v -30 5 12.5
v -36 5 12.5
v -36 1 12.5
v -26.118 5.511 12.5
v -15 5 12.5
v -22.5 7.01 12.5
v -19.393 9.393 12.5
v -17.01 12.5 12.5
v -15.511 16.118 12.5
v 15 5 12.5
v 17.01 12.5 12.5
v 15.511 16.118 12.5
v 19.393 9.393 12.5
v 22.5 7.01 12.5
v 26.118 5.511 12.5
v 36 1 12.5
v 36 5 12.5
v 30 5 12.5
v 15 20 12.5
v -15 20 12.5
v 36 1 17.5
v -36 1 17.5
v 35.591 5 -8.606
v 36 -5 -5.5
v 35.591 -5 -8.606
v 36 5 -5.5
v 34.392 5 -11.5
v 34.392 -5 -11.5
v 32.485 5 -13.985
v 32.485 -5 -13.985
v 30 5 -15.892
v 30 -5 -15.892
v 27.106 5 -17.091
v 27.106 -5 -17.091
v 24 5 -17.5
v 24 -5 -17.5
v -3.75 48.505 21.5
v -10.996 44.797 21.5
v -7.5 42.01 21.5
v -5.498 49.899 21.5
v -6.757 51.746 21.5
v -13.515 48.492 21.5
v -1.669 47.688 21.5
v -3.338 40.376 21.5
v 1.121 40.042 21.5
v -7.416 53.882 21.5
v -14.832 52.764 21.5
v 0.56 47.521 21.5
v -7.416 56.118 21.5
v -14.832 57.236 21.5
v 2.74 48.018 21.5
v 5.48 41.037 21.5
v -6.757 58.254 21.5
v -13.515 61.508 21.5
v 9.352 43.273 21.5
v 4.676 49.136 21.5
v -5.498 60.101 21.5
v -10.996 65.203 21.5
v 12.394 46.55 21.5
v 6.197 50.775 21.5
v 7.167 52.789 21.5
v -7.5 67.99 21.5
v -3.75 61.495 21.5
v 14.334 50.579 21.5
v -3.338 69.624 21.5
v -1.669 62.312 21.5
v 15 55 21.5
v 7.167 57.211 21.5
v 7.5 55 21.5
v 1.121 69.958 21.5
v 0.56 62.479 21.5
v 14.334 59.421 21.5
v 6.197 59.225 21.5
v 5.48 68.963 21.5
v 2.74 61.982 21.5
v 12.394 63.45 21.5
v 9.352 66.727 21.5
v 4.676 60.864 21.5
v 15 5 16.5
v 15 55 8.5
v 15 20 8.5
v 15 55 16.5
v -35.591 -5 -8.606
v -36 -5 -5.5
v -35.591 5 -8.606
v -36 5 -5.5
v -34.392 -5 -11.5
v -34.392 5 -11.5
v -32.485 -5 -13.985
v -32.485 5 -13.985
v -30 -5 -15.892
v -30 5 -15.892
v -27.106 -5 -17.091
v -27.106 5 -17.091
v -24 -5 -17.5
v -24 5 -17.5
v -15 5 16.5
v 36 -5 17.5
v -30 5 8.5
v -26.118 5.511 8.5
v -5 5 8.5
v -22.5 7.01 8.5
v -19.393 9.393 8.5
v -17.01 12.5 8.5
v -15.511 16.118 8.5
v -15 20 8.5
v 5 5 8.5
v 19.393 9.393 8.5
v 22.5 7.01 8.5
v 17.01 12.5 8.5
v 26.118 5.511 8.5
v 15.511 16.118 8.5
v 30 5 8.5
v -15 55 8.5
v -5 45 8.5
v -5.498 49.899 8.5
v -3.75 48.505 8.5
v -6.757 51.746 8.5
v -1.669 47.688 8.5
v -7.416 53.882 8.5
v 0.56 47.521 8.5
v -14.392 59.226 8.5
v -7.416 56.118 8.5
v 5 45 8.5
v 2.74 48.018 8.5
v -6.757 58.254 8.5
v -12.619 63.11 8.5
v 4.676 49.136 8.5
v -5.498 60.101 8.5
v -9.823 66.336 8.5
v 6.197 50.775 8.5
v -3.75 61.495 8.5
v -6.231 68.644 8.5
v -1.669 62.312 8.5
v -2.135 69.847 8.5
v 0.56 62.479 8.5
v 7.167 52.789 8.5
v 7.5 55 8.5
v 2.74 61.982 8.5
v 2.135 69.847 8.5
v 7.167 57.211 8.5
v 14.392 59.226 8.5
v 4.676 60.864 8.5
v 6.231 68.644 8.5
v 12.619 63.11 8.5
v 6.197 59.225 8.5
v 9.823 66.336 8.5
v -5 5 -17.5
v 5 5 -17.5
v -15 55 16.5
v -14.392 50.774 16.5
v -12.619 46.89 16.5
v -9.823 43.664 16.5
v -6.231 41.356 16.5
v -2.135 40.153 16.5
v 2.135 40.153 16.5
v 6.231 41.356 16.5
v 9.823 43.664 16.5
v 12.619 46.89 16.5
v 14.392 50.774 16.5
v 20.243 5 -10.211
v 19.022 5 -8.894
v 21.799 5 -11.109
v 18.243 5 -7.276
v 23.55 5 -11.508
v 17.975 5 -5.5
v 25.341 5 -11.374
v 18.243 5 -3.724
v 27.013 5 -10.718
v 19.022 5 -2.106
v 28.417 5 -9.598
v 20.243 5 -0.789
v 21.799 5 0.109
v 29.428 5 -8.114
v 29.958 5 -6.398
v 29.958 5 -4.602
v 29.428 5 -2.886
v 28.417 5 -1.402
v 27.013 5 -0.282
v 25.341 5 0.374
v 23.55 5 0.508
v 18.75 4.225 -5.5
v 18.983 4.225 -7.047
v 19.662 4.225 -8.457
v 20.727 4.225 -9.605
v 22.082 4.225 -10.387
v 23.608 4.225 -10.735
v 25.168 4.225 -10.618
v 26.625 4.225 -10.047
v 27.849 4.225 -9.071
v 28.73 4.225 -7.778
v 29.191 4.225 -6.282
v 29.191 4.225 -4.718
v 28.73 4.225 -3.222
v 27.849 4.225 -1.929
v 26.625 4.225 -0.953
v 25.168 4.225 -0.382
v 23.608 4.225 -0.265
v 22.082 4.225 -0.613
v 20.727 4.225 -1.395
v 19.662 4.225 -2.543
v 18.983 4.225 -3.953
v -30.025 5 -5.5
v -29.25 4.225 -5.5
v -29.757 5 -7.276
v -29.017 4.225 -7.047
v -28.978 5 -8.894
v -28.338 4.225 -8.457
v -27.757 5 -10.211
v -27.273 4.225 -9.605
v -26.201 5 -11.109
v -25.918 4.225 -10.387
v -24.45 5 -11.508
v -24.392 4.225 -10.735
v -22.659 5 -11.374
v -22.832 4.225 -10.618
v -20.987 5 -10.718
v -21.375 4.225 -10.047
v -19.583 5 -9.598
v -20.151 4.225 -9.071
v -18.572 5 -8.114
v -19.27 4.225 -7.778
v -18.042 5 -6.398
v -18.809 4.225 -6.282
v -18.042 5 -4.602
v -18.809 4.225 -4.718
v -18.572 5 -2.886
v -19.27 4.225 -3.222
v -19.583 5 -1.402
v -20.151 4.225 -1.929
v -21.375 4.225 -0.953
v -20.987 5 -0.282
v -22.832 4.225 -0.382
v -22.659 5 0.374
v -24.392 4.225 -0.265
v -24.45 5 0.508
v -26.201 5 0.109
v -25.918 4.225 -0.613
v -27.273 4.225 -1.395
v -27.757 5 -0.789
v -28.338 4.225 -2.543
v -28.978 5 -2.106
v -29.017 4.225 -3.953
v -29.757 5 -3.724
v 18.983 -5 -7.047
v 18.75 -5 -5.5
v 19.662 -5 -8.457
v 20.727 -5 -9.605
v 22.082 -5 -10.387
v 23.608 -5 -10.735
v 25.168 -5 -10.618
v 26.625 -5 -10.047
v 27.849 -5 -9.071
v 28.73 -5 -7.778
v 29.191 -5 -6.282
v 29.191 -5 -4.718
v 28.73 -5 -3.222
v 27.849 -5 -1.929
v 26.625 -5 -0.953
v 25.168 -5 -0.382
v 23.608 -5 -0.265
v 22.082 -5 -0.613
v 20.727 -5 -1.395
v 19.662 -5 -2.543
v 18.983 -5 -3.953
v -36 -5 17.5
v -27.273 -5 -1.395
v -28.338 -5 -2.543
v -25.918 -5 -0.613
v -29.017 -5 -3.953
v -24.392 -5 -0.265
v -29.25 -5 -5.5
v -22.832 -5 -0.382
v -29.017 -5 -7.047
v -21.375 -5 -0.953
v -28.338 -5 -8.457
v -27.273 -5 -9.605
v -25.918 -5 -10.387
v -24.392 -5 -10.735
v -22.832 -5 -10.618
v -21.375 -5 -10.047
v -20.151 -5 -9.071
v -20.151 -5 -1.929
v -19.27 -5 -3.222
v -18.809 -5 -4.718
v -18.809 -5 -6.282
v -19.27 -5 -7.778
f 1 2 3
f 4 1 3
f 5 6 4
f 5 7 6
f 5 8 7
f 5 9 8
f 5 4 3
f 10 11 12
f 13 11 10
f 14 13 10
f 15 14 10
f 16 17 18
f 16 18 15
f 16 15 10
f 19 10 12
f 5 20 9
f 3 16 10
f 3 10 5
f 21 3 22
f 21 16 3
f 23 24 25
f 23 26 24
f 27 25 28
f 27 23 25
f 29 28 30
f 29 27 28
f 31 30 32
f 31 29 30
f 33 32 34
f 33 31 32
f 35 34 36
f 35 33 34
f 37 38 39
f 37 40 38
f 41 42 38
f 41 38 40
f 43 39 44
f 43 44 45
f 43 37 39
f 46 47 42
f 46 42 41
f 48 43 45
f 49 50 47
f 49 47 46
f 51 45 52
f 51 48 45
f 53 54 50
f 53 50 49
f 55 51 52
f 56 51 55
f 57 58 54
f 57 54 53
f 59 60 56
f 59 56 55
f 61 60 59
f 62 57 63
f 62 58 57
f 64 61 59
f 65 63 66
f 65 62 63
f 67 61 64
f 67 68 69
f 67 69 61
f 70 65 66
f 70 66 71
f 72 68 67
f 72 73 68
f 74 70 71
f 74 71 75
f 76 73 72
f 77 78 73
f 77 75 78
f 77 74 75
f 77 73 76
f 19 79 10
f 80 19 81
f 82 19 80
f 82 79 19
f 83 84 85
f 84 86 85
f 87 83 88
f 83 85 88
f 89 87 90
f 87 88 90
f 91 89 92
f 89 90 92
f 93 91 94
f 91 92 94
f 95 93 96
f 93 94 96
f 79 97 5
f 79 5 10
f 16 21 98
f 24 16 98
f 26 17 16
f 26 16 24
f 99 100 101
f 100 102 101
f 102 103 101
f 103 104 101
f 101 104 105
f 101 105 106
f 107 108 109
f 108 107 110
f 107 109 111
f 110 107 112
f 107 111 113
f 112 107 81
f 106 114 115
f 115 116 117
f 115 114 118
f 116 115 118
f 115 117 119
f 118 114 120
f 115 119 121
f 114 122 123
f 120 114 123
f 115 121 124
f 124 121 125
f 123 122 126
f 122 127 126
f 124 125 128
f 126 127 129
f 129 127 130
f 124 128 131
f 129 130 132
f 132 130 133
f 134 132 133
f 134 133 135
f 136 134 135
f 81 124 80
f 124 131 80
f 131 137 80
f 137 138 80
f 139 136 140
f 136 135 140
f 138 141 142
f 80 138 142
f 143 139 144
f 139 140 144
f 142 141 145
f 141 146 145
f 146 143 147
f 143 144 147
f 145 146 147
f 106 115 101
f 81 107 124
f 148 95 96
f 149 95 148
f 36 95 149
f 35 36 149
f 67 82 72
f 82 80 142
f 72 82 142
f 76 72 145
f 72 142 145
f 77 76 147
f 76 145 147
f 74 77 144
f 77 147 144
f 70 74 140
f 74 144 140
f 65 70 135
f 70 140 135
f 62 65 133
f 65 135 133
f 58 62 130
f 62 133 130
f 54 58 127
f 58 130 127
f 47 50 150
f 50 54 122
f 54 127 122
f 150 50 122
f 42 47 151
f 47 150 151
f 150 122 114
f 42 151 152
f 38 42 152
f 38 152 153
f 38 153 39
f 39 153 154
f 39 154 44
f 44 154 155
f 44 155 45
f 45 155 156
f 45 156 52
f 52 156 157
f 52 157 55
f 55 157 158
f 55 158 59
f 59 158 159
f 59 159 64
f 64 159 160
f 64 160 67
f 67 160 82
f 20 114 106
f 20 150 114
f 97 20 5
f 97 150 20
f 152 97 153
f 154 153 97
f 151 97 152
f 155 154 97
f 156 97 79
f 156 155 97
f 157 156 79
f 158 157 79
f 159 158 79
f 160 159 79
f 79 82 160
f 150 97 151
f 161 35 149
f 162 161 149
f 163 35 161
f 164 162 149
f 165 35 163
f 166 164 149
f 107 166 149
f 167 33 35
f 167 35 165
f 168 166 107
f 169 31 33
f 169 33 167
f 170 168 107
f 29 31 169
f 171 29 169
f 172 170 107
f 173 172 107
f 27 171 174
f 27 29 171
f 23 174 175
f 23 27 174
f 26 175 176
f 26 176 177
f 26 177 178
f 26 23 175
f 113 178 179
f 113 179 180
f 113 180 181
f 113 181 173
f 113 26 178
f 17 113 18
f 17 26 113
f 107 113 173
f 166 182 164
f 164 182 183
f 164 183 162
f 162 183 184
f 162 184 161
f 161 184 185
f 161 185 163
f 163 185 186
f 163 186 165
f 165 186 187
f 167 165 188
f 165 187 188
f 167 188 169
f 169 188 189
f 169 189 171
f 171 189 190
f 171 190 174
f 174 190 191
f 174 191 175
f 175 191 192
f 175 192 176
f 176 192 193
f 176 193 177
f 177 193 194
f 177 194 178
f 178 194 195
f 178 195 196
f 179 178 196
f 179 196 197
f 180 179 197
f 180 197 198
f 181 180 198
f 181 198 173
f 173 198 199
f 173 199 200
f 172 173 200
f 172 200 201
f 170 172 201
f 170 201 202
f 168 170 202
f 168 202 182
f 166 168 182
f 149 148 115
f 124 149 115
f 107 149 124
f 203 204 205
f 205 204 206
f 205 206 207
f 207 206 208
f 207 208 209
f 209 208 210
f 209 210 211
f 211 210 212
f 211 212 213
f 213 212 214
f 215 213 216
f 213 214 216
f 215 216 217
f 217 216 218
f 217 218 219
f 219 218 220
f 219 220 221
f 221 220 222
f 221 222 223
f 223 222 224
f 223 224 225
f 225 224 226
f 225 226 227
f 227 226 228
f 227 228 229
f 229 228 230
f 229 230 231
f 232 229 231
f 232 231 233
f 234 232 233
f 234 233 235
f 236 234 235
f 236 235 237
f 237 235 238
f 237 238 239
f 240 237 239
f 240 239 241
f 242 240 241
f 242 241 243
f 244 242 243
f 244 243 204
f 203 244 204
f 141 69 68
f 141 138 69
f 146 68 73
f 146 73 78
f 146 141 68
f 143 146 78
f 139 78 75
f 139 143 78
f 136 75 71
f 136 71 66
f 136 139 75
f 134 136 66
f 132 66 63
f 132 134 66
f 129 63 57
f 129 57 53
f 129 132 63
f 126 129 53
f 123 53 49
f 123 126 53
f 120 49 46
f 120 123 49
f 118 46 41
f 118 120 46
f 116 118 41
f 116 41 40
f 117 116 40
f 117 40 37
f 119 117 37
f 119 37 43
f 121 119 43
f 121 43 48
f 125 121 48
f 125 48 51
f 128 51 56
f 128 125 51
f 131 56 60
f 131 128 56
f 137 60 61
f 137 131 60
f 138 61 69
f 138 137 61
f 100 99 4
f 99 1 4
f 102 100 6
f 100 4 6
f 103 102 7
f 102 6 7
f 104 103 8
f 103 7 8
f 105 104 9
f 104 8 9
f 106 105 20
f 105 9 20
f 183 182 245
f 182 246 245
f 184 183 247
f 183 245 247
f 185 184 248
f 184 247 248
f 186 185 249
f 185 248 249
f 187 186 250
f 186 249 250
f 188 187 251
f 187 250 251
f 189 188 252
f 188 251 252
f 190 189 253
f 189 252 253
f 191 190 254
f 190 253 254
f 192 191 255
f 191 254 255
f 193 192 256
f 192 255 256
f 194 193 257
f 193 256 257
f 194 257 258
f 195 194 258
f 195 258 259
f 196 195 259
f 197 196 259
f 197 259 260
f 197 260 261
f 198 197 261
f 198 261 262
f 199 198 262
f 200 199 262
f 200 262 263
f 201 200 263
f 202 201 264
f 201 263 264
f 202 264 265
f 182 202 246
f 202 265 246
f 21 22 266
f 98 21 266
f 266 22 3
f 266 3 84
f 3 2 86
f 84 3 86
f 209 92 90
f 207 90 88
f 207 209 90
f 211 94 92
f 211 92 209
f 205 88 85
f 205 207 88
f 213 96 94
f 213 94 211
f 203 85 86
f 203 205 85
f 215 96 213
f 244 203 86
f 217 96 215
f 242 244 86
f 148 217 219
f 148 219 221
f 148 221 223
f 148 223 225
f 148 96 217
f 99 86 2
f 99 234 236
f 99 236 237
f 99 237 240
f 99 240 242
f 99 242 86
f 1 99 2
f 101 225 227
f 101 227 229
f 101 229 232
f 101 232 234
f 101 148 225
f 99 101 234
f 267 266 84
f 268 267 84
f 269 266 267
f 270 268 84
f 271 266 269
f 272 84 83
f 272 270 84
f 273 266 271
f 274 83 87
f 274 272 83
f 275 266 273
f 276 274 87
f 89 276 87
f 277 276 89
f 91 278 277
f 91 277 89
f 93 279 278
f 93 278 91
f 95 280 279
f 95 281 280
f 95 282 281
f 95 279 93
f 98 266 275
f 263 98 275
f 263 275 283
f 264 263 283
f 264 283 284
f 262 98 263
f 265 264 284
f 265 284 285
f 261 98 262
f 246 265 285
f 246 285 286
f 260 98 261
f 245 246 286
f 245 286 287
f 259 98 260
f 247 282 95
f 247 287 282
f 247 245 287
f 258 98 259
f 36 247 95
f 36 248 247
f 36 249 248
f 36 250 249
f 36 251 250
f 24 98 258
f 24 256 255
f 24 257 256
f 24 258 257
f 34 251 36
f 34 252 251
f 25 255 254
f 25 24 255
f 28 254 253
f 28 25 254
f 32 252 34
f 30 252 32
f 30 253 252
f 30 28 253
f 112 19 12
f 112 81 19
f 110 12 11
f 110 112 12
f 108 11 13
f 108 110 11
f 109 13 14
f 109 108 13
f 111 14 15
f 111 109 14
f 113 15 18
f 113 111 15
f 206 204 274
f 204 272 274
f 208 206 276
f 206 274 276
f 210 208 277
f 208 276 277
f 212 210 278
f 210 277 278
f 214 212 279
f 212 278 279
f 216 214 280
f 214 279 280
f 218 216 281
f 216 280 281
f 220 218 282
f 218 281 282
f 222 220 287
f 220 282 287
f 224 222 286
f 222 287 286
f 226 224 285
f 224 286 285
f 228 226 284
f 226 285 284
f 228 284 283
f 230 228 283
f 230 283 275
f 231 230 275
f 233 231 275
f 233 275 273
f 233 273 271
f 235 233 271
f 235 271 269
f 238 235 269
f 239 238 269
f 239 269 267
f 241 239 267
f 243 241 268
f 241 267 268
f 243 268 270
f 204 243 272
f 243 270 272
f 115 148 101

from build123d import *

# Parameters (mm, degrees)
BOSS_EXTRUDE1_DEPTH              = 36
SKETCH2_R                        = 7.5
BOSS_EXTRUDE2_DEPTH              = 4
SKETCH3_R                        = 15
SKETCH3_R_2                      = 7.5
BOSS_EXTRUDE3_DEPTH              = 5
FILLET2_R                        = 15
RIB1_REACH                       = 83.598
SKETCH4_WALL_W                   = 212.903642704
SKETCH4_WALL_H                   = 10
FILLET3_R                        = 12
M12X1_5_TAPPED_HOLE1_D           = 10.5
M12X1_5_TAPPED_HOLE1_CSINK_D     = 12.05
M12X1_5_TAPPED_HOLE1_CSINK_ANGLE = 90


with BuildPart() as part:
    # Sketch1 → Boss-Extrude1 (new, symmetric)
    with BuildSketch(Plane(origin=(0, 0, 0), x_dir=(0, 0, -1), z_dir=(1, 0, 0))):
        Polygon((-17.5, 1), (-17.5, -5), (17.5, -5), (17.5, 5), (-12.5, 5), (-12.5, 1), align=None)
    extrude(amount=BOSS_EXTRUDE1_DEPTH, both=True)

    # Sketch2 → Boss-Extrude2 (add, symmetric)
    with BuildSketch(Plane.XY.offset(12.5)):
        with BuildLine():
            ThreePointArc((15, 55), (0, 70), (-15, 55))
            Line((-15, 55), (-15, 5))
            Line((-15, 5), (15, 5))
            Line((15, 5), (15, 55))
        make_face()
        with Locations((0, 55)):
            Circle(SKETCH2_R, mode=Mode.SUBTRACT)
    extrude(amount=BOSS_EXTRUDE2_DEPTH, both=True)

    # Sketch3 → Boss-Extrude3 (add)
    with BuildSketch(Plane.XY.offset(16.5)):
        with Locations((0, 55)):
            Circle(SKETCH3_R)
        with Locations((0, 55)):
            Circle(SKETCH3_R_2, mode=Mode.SUBTRACT)
    extrude(amount=BOSS_EXTRUDE3_DEPTH)

    # Fillet2
    fillet2_edges = [part.edges().sort_by_distance(p)[0] for p in [
        (-15, 5, 10.5),
        (15, 5, 10.5),
    ]]
    fillet(fillet2_edges, radius=FILLET2_R)

    # Sketch4 wall → Rib1 (add, up to next)
    with BuildSketch(Plane(origin=(0, 25, -4.5), x_dir=(0, 0.838443616301, 0.544988350595), z_dir=(0, -0.544988350595, 0.838443616301)), mode=Mode.PRIVATE) as rib1_sk1:
        Rectangle(SKETCH4_WALL_W, SKETCH4_WALL_H)
    rib1_tool1 = extrude(rib1_sk1.sketch, amount=RIB1_REACH, mode=Mode.PRIVATE) - part.part
    add(rib1_tool1.solids().sort_by_distance((0, 25, -4.5))[0])

    # Fillet3
    fillet3_edges = [part.edges().sort_by_distance(p)[0] for p in [
        (36, 0, -17.5),
        (-36, 0, -17.5),
    ]]
    fillet(fillet3_edges, radius=FILLET3_R)

    # M12x1.5 Tapped Hole1 (through all)
    with Locations(Plane(origin=(0, 5, 0), x_dir=(1, 0, 0), z_dir=(0, 1, 0))):
        with Locations((24, 5.5), (-24, 5.5)):
            CounterSinkHole(M12X1_5_TAPPED_HOLE1_D / 2, M12X1_5_TAPPED_HOLE1_CSINK_D / 2, counter_sink_angle=M12X1_5_TAPPED_HOLE1_CSINK_ANGLE)


solid = part.part
